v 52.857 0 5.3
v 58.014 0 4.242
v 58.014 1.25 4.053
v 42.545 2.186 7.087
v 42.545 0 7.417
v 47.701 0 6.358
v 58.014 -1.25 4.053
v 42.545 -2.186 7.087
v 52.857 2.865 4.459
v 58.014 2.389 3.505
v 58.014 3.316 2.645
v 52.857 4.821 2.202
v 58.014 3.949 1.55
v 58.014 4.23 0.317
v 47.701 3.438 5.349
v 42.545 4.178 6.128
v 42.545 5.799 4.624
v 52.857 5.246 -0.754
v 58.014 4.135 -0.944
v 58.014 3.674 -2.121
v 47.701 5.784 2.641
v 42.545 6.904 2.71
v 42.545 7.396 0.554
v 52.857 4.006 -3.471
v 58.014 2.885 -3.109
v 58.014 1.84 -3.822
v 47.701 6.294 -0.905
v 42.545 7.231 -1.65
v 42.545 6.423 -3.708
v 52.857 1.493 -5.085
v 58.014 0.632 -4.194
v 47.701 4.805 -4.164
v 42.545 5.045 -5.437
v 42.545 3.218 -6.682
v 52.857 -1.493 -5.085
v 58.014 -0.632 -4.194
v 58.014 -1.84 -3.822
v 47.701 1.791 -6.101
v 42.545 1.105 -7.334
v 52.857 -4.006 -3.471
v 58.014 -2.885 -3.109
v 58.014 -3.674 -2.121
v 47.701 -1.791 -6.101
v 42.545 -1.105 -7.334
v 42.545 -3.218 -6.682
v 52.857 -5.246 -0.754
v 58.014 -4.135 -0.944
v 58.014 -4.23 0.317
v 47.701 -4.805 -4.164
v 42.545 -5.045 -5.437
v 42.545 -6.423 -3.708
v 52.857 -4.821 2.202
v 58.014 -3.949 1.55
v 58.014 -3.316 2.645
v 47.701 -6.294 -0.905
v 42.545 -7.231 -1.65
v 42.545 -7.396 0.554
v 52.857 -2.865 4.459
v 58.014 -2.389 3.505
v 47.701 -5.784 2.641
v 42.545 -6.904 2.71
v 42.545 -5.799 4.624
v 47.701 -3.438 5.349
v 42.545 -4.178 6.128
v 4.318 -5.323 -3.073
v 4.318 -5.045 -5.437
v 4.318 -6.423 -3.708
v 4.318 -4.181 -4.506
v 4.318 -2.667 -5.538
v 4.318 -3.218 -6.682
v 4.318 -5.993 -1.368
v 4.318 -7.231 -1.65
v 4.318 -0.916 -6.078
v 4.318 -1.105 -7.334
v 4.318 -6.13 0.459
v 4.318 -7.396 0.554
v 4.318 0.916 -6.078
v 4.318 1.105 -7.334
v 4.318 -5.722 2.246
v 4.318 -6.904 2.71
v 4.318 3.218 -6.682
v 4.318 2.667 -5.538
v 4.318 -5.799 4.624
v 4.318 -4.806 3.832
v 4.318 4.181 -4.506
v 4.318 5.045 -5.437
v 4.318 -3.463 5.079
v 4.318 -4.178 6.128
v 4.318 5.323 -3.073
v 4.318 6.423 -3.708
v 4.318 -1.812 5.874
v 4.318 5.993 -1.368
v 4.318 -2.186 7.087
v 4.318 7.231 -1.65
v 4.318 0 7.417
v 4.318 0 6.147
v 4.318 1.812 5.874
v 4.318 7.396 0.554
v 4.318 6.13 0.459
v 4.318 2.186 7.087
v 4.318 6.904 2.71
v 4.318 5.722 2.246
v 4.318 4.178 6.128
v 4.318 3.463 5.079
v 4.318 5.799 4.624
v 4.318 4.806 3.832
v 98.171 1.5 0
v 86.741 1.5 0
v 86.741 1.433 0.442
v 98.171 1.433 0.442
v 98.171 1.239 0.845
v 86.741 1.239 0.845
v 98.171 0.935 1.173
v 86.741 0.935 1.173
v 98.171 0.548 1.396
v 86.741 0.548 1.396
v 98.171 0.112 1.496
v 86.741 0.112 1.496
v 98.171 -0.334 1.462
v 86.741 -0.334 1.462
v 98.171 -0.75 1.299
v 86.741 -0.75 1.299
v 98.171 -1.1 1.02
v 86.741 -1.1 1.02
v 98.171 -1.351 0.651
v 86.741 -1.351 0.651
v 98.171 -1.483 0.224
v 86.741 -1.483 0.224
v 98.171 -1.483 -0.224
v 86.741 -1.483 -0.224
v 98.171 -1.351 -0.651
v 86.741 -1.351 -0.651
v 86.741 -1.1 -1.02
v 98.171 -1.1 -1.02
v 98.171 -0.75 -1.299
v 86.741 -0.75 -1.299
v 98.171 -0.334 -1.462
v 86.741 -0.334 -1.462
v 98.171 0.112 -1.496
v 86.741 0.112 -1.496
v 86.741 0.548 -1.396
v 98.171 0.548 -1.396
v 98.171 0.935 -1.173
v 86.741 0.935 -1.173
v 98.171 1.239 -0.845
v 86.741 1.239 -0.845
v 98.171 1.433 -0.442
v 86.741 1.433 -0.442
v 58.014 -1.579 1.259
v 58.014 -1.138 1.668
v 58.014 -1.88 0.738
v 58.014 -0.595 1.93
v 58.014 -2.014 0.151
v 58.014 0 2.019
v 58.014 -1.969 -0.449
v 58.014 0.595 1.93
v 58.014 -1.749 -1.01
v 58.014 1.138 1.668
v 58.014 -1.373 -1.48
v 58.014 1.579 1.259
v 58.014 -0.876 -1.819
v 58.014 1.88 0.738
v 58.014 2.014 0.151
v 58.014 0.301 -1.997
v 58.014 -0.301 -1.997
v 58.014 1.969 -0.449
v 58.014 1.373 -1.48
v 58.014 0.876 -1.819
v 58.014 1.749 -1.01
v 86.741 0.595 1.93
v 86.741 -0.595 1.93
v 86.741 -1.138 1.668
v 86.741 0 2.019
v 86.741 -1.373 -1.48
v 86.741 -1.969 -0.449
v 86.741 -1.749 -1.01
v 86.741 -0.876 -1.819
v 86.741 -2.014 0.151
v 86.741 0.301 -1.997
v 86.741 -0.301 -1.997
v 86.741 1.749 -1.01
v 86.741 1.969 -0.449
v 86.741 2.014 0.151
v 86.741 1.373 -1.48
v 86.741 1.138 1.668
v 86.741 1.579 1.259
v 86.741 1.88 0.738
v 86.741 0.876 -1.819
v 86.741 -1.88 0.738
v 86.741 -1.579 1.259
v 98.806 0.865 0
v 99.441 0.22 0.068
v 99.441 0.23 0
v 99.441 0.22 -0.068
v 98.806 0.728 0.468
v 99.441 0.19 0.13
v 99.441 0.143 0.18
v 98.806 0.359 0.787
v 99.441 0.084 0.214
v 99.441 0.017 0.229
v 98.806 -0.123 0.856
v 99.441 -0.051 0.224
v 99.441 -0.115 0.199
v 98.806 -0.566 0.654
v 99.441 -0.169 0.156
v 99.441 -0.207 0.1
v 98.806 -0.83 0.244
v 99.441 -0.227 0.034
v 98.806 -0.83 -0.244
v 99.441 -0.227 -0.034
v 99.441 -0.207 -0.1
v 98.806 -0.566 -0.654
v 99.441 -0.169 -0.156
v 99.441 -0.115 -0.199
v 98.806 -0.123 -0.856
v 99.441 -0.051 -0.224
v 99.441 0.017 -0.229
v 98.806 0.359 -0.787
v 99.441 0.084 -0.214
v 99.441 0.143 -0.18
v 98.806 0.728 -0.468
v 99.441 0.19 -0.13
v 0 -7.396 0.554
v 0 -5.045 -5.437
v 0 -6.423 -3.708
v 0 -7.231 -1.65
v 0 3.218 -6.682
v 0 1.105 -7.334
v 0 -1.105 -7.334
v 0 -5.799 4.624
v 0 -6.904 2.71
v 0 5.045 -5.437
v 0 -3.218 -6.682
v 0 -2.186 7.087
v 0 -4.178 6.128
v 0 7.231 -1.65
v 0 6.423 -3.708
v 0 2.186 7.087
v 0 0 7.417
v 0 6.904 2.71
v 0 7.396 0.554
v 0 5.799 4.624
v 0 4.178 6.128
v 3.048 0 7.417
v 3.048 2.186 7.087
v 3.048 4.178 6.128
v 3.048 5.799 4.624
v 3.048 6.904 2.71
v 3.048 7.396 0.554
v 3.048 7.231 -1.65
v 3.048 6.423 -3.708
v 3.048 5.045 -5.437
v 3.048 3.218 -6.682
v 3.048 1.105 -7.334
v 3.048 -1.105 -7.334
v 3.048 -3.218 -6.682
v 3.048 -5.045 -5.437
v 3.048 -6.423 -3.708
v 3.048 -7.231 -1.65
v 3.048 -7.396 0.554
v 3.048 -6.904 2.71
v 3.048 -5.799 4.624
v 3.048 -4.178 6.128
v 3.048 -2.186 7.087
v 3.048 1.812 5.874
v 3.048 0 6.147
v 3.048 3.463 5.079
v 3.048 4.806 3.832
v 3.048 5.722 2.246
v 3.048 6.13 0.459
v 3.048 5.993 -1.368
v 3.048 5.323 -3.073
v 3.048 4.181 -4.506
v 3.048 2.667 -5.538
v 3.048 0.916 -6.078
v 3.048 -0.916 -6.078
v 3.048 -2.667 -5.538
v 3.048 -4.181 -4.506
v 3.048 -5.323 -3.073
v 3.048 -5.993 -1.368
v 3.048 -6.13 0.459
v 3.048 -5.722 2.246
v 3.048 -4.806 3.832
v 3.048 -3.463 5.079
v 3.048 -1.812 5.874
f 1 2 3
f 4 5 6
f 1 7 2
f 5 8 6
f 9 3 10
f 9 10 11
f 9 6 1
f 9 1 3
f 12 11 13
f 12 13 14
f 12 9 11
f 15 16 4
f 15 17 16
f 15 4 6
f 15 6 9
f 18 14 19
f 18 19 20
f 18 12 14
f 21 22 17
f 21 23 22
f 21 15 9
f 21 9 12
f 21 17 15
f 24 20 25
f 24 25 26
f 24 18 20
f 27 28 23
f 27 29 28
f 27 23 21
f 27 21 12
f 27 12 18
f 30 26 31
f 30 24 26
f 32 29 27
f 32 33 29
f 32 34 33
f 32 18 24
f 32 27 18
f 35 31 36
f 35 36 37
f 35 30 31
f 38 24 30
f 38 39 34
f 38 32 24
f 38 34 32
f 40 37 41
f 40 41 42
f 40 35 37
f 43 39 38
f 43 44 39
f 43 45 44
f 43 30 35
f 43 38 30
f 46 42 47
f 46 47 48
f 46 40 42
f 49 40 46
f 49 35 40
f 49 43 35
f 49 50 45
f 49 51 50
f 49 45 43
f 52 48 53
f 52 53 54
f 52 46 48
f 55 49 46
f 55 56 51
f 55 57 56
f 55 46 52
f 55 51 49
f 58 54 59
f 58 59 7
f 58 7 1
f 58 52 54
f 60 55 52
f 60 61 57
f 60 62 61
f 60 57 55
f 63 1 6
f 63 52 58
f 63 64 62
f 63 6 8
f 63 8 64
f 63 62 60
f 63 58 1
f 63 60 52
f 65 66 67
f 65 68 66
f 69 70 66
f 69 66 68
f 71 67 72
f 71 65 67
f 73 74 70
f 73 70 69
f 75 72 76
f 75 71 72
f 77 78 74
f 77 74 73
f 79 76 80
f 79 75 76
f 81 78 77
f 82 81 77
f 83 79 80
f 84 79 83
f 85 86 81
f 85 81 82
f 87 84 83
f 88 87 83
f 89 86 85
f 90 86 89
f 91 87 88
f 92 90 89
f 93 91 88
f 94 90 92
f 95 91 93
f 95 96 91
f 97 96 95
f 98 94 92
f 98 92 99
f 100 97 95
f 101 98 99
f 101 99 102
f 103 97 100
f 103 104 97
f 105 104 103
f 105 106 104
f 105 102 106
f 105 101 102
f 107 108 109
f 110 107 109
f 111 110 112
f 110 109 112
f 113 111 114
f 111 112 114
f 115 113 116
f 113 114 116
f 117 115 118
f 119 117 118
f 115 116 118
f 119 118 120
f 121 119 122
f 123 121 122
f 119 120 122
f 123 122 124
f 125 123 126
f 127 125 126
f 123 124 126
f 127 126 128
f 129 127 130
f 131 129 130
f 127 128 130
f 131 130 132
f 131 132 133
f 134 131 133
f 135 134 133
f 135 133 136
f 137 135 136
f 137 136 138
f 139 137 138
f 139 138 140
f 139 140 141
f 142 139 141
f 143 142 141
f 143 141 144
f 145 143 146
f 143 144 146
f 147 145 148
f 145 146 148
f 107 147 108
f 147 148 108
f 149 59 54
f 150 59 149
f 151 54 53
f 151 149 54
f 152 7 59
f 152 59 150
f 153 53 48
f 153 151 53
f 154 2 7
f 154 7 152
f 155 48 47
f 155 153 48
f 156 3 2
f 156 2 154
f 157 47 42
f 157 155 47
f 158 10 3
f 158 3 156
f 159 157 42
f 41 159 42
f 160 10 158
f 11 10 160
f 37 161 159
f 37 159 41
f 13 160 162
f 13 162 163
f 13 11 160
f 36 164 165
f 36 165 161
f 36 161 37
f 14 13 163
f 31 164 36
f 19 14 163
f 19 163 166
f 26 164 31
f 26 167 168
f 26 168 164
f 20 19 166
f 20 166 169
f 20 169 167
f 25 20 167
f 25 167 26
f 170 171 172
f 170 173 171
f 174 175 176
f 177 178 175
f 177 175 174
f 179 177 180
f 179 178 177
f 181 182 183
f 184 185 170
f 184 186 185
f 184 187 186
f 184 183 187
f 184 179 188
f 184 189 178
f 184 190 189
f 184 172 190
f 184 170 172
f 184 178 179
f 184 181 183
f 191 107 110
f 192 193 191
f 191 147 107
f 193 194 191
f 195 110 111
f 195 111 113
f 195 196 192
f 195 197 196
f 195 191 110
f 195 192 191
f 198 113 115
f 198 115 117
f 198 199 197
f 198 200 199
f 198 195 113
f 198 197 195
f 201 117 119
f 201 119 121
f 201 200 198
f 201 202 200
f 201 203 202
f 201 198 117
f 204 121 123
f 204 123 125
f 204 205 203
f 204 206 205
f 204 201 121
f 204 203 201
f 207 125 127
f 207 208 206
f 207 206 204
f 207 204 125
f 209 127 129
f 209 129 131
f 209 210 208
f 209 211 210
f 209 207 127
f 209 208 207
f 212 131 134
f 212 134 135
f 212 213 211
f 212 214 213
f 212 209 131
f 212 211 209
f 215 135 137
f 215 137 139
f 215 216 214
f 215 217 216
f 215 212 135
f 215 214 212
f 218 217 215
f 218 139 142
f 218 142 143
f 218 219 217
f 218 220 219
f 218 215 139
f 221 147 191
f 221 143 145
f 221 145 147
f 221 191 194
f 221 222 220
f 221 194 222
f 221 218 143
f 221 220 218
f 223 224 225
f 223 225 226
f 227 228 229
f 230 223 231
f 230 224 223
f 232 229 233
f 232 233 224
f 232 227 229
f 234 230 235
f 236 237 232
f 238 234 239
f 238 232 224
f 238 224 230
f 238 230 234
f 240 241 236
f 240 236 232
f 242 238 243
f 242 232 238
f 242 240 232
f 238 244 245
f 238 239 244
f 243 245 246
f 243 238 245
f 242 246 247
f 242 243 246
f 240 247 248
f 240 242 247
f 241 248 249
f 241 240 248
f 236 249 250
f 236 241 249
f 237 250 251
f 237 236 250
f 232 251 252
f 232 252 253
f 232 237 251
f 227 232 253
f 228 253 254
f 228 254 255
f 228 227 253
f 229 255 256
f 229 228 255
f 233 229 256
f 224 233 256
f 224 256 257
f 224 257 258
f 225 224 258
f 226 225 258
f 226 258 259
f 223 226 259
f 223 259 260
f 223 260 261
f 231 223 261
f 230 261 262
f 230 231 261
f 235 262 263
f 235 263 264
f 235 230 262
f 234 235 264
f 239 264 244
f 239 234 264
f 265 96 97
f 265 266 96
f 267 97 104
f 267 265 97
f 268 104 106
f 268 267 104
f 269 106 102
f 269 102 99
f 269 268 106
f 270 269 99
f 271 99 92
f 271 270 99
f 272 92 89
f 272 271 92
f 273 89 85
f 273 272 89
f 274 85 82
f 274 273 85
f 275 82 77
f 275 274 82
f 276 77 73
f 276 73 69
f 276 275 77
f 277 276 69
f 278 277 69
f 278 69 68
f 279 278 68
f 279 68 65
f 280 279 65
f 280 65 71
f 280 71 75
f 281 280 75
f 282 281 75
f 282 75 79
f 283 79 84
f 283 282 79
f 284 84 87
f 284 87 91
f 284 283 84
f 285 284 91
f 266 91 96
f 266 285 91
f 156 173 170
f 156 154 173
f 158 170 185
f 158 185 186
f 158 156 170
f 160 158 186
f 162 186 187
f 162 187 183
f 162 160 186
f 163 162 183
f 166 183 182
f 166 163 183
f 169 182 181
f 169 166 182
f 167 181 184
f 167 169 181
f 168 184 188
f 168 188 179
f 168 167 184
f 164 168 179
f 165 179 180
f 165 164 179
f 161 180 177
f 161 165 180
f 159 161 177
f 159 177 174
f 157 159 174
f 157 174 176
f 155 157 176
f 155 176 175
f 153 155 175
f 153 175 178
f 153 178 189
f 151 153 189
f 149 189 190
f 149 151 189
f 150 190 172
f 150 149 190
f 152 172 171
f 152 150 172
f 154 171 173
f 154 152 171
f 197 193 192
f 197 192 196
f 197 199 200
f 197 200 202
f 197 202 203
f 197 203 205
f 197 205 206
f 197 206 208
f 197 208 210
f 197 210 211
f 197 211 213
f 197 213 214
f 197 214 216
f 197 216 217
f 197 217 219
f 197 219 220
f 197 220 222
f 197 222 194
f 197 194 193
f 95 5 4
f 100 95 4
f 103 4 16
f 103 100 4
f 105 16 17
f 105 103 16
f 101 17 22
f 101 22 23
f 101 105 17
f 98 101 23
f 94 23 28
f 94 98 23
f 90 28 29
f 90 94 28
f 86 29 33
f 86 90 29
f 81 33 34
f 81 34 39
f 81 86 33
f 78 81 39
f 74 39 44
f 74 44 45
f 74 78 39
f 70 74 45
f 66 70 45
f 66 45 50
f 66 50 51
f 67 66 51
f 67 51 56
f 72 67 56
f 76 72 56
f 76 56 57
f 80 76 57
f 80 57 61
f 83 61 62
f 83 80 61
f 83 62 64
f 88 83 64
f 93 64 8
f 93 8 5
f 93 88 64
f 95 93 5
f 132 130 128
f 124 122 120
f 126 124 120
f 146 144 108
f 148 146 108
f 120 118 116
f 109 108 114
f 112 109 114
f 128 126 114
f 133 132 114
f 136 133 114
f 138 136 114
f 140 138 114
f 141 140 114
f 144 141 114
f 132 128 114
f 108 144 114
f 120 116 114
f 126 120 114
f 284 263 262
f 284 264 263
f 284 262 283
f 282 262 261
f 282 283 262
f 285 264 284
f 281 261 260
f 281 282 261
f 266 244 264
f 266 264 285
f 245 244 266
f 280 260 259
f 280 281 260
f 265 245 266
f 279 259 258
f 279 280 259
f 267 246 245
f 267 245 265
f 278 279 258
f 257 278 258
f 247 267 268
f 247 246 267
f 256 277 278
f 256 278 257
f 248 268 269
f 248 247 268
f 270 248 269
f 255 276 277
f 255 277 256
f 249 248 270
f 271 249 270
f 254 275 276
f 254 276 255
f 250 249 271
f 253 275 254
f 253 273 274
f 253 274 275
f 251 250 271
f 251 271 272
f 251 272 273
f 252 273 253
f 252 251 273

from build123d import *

# Parameters (mm, degrees)
F2_R     = 1.5
F3_DEPTH = 12.7
F4_SIZE  = 1.27


with BuildPart() as f1:
    # F0 (on Front) → F1 (revolve)
    with BuildSketch(Plane.XZ):
        Polygon((0, 7.4168), (0, 0), (86.741, 0), (86.741, 2.0193), (58.0136, 2.0193), (58.0136, 4.2418), (42.545, 7.4168), (4.318, 7.4168), (4.318, 6.1468), (3.048, 6.1468), (3.048, 7.4168), align=None)
    revolve(axis=Axis((43.3705, 0, 0), (-1, 0, 0)))


with BuildPart() as f3:
    # F2 (on face) → F3 (new body)
    with BuildSketch(Plane.YZ.offset(86.741)):
        Circle(F2_R)
    extrude(amount=F3_DEPTH)

    # F4
    f4_edges = [f3.edges().sort_by_distance(p)[0] for p in [
        (99.441, -1.5, 0),
    ]]
    chamfer(f4_edges, length=F4_SIZE)


solid = Compound([f1.part, f3.part])
